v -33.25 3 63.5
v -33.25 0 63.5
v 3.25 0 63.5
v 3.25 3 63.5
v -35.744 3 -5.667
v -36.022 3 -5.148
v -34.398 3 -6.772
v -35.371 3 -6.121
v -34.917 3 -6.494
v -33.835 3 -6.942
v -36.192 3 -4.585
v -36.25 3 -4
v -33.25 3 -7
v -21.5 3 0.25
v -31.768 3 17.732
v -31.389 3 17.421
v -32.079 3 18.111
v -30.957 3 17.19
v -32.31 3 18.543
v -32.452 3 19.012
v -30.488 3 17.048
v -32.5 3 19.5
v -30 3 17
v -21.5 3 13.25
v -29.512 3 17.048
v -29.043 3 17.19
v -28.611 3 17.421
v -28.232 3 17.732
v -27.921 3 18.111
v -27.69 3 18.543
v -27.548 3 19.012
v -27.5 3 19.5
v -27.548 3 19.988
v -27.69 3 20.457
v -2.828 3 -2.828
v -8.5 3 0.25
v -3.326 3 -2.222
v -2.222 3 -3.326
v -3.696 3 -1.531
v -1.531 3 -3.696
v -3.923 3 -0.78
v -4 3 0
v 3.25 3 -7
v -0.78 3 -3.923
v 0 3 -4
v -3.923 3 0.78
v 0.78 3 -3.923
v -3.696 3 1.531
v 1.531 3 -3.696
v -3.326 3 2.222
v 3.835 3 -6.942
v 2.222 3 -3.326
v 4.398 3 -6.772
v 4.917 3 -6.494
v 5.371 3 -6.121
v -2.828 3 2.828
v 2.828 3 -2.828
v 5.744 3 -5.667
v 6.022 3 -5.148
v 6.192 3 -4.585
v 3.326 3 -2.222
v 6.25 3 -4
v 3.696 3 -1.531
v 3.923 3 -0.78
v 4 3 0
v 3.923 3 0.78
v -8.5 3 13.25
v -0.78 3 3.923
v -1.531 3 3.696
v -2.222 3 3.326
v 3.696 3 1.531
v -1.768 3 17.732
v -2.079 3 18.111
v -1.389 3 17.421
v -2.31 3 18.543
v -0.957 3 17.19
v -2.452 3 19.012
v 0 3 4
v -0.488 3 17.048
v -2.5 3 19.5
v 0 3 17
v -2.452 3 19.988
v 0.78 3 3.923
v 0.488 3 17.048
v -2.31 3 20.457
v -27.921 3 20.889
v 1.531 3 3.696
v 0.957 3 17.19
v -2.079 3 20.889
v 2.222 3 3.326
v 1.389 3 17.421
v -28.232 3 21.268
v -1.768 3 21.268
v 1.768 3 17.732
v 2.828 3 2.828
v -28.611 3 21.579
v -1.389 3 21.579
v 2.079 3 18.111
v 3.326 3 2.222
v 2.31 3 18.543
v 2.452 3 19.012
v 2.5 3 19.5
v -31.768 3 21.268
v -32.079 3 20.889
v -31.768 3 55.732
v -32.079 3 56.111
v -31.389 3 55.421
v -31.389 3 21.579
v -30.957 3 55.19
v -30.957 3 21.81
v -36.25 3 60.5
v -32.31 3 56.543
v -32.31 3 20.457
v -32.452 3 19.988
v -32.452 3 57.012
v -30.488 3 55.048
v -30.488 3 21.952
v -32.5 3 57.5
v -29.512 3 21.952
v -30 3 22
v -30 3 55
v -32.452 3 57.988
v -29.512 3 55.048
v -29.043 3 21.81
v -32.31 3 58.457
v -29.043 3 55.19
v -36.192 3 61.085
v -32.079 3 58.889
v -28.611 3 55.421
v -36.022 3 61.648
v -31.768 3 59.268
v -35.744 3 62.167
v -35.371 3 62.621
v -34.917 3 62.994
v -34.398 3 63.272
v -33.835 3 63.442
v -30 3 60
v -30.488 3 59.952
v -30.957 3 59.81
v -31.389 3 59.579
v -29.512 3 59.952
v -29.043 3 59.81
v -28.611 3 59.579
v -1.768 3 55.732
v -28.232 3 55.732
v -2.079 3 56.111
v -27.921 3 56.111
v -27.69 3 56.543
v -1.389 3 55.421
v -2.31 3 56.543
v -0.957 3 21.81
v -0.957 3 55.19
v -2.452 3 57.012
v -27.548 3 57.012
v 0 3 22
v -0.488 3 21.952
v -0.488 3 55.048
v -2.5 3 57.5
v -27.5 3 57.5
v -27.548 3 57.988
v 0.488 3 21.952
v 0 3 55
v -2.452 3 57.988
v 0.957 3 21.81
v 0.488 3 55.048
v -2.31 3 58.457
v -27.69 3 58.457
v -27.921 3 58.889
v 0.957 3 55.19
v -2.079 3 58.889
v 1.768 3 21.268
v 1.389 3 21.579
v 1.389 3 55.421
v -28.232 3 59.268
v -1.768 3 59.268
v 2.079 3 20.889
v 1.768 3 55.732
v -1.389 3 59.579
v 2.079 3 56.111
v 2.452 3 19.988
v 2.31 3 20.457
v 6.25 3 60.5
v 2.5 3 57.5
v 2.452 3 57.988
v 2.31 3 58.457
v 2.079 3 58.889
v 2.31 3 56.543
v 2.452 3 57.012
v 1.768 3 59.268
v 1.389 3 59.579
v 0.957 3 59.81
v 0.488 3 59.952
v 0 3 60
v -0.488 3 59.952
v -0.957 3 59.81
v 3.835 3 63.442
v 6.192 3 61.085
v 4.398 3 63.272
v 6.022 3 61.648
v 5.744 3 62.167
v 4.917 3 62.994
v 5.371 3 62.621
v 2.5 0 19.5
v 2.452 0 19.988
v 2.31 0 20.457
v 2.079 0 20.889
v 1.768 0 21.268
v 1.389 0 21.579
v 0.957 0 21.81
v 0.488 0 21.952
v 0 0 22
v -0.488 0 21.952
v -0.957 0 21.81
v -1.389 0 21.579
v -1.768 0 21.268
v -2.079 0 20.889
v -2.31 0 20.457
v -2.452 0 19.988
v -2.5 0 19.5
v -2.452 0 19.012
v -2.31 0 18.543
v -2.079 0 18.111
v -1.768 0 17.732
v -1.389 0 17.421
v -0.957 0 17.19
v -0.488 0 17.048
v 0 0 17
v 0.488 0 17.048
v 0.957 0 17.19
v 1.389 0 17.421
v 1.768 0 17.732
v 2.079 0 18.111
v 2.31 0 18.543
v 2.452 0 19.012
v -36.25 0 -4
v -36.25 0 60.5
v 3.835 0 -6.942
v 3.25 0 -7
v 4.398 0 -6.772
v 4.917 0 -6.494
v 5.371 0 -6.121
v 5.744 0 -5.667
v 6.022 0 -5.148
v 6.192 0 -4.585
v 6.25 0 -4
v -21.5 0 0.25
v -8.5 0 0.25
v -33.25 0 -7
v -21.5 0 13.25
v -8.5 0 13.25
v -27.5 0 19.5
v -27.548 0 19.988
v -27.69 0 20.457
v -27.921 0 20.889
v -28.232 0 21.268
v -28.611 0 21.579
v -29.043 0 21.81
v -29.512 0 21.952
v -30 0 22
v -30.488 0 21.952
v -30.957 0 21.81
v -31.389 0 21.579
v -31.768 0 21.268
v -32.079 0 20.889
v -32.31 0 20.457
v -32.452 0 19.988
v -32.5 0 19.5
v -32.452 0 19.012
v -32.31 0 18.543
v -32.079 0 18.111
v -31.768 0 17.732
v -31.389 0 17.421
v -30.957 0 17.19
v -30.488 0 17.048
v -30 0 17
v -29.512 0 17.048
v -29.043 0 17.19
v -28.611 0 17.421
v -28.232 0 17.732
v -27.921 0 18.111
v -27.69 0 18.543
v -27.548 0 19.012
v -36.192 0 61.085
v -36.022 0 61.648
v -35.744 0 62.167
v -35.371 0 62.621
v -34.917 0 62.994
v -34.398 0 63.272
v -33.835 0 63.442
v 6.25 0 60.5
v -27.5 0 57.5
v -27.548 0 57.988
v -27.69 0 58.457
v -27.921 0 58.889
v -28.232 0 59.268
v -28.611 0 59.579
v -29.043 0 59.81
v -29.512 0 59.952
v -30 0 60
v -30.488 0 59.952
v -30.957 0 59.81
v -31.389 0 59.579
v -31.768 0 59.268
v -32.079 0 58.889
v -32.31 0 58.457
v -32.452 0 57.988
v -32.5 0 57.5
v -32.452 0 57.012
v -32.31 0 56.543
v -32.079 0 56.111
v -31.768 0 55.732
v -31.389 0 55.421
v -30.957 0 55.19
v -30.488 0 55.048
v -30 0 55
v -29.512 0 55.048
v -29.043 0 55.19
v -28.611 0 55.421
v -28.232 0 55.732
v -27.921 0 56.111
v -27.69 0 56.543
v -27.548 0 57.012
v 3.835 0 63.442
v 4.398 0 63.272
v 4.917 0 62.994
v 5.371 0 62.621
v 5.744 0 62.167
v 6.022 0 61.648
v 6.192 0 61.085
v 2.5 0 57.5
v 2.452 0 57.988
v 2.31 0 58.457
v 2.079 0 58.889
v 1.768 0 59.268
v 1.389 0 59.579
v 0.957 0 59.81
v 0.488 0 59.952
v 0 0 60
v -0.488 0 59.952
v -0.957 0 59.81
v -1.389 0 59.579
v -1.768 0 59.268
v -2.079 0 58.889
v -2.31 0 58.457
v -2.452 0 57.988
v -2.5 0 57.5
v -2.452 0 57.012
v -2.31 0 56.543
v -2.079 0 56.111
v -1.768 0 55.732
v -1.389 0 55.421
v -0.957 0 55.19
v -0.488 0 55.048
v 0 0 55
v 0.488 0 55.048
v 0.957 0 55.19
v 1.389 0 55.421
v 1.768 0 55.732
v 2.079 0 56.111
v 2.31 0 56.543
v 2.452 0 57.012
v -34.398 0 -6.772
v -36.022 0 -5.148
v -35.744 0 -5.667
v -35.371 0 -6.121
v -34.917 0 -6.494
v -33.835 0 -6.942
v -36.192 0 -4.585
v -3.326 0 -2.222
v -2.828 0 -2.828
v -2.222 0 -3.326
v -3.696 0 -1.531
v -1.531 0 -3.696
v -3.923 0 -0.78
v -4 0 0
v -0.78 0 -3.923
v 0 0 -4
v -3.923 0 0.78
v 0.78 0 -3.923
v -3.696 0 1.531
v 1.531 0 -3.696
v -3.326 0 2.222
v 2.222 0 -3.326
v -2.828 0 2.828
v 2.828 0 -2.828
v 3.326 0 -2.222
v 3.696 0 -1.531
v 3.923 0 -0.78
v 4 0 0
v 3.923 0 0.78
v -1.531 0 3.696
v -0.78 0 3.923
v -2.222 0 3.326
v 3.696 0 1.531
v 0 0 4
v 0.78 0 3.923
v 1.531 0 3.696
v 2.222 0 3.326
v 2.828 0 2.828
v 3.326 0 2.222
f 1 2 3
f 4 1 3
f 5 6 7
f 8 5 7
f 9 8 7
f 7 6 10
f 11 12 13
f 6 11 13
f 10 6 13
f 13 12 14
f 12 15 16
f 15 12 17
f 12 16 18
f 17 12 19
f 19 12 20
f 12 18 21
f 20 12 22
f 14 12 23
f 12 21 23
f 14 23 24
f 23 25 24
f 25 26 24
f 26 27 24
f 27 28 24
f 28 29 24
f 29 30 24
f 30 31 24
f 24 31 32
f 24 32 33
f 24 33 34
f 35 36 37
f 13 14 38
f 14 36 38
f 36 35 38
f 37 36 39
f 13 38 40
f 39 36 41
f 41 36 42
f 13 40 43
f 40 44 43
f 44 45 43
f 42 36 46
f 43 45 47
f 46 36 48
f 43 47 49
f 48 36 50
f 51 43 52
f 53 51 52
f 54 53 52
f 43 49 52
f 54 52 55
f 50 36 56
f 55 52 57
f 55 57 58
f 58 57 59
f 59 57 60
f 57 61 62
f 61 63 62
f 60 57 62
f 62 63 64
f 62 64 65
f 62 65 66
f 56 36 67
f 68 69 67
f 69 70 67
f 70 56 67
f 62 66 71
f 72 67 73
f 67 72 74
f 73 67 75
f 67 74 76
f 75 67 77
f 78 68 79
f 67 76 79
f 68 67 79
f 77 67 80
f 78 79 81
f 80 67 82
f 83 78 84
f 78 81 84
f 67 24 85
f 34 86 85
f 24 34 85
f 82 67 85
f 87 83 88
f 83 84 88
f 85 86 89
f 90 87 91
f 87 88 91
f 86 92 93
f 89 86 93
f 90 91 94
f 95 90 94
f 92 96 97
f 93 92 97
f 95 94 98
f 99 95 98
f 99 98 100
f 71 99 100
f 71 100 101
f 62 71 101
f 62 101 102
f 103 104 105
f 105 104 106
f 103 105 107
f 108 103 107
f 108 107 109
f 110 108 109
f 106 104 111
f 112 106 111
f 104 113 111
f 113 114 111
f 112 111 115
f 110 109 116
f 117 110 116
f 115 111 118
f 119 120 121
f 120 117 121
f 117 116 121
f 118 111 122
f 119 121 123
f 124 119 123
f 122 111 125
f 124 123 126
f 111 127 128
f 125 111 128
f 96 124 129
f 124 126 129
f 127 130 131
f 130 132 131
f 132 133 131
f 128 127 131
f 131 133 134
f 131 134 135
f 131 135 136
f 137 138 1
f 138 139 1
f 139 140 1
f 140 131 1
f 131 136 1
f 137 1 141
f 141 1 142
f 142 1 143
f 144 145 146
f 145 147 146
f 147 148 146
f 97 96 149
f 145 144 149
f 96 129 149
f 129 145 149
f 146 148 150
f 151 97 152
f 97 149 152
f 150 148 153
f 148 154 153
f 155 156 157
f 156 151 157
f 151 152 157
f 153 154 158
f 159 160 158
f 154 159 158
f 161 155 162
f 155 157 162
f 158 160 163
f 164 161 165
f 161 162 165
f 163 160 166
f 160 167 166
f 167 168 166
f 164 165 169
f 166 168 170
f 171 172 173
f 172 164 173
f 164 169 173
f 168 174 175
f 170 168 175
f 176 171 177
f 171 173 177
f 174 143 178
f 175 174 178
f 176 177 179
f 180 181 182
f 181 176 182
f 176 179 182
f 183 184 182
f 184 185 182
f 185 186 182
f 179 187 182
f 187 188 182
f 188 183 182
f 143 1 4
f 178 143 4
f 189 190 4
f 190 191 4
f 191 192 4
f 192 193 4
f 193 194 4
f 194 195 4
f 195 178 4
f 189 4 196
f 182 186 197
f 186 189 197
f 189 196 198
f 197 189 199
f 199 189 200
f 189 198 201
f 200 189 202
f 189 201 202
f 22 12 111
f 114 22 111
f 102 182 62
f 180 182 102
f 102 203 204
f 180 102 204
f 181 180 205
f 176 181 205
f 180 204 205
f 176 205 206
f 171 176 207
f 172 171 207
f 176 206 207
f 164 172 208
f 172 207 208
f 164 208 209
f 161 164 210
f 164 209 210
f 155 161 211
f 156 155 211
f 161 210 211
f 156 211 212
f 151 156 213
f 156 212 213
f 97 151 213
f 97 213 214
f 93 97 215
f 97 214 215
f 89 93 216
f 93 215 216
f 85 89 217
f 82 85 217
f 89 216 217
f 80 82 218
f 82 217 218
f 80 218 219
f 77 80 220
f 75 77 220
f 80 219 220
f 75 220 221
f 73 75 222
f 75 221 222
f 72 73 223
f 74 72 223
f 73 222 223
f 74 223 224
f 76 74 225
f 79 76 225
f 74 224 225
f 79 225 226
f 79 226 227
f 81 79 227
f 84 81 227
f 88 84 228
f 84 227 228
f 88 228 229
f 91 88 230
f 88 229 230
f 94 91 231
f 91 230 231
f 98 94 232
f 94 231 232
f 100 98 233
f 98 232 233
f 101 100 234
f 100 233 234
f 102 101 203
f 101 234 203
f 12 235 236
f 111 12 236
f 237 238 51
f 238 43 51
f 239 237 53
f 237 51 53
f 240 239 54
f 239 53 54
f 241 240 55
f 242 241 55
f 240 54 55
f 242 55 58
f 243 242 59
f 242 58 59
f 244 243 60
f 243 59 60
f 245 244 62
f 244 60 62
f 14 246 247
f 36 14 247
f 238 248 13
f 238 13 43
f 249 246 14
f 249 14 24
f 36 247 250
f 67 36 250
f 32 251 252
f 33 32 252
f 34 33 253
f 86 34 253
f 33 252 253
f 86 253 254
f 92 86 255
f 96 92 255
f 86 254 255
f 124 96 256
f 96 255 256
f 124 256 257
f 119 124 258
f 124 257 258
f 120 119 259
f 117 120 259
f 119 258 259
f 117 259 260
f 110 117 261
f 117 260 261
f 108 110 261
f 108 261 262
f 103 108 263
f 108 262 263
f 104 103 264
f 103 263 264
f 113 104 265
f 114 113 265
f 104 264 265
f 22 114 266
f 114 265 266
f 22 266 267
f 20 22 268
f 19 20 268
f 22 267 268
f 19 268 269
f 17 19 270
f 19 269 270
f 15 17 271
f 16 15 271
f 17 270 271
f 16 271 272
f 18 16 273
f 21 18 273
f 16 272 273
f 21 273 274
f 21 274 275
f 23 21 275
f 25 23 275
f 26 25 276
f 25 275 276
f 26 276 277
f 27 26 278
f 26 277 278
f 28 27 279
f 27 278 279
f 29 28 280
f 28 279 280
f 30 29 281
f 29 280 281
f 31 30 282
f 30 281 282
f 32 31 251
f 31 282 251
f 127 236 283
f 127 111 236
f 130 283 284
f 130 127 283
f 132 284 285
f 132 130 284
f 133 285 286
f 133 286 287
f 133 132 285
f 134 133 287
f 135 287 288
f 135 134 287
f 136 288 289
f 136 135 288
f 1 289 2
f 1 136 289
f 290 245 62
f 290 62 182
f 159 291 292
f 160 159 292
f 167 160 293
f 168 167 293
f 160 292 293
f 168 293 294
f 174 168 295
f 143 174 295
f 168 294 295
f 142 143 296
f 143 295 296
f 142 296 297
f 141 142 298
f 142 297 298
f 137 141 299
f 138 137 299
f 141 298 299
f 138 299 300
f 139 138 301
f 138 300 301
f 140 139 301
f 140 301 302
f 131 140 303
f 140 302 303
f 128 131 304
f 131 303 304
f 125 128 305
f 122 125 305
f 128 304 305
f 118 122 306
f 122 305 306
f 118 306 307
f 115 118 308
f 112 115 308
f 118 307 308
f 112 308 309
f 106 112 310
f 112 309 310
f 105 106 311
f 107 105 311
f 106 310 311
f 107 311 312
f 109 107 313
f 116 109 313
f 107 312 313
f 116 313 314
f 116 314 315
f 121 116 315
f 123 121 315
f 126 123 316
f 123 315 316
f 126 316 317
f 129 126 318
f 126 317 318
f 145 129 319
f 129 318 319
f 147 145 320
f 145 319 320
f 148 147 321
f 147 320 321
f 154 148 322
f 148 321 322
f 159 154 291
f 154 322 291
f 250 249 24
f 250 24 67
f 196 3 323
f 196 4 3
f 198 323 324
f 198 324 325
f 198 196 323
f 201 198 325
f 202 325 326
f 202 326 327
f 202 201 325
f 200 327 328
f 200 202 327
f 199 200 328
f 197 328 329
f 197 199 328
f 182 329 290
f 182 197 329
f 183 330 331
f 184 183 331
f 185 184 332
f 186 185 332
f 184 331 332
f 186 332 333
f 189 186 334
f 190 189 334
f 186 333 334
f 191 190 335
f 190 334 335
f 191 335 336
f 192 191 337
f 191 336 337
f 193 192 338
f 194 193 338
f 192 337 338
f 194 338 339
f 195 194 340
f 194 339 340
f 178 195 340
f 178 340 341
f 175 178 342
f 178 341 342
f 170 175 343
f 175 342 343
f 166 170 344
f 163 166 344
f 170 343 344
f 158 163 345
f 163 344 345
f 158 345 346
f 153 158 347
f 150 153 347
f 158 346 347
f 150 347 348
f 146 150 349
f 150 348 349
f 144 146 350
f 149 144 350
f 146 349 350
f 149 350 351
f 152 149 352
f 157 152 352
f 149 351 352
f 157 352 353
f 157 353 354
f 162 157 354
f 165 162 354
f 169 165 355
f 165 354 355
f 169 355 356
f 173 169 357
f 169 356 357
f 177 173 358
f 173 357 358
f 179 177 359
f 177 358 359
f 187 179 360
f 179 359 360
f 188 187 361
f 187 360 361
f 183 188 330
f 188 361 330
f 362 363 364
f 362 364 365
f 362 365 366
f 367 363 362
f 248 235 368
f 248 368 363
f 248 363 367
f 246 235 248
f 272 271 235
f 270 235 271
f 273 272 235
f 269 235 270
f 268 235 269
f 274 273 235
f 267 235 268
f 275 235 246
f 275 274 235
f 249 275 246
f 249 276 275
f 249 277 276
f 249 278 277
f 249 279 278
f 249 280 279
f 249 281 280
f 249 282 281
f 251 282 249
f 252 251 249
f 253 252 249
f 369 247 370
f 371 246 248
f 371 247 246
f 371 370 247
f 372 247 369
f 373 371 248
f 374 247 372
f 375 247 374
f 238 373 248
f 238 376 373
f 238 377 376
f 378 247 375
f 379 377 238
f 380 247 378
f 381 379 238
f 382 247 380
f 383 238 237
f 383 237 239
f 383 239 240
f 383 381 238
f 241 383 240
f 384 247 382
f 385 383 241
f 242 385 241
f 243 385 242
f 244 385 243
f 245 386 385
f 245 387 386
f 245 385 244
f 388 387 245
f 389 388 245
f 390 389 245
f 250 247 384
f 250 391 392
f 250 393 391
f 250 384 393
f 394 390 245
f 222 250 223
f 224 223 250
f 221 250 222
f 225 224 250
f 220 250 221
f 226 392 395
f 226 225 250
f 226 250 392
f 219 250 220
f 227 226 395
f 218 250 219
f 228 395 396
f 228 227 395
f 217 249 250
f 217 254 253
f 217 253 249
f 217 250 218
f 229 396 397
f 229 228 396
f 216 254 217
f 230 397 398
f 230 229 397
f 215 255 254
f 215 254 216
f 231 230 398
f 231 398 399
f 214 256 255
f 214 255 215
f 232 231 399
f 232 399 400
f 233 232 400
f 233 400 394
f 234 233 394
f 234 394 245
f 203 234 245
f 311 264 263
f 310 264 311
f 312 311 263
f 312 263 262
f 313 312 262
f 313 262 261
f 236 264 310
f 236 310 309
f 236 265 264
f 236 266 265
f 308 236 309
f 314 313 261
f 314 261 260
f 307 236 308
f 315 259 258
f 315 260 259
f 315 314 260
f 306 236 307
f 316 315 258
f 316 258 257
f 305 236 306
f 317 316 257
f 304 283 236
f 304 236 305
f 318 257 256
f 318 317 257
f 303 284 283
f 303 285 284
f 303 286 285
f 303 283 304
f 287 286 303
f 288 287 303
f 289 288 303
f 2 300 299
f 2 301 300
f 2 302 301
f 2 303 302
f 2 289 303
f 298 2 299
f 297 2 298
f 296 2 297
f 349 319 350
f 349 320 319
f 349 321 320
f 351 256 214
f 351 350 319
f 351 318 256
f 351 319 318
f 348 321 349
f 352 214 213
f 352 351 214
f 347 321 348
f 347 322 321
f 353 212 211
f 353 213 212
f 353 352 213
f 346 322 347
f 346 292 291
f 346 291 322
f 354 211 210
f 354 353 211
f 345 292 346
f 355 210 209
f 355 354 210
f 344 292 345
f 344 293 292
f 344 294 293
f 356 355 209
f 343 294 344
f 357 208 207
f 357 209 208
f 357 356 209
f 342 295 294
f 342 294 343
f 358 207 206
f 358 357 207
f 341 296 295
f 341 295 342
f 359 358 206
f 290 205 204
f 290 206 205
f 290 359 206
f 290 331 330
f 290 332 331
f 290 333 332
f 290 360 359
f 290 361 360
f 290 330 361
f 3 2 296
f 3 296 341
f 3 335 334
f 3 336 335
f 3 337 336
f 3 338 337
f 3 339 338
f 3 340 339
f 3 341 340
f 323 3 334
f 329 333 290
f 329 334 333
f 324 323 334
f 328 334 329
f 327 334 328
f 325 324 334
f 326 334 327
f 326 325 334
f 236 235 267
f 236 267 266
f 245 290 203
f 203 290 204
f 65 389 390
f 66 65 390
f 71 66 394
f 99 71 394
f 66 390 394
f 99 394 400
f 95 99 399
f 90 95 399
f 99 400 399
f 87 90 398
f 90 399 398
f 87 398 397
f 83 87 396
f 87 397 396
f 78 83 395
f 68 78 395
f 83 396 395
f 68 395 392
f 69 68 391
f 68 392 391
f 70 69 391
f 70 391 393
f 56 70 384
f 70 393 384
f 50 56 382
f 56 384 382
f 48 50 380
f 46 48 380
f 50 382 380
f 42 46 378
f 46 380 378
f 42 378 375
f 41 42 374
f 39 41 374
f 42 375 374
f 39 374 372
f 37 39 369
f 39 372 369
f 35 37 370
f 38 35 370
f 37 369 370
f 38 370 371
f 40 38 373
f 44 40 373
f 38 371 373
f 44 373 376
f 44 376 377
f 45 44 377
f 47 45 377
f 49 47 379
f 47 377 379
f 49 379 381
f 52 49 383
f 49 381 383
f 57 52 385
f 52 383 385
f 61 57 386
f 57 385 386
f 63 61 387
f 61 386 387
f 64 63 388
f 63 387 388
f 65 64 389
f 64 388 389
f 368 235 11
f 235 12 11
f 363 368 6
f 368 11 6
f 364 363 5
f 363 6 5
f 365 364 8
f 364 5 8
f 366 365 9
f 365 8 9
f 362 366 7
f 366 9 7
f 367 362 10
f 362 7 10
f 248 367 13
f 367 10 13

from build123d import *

# Parameters (mm, degrees)
F0_W     = 42.5
F0_H     = 70.5
F0_R     = 2.5
F0_W_2   = 13
F0_H_2   = 13
F0_R_2   = 4
F1_DEPTH = 3
F2_R     = 3


with BuildPart() as f1:
    # F0 (on Front) → F1 (new body)
    with BuildSketch(Plane.XZ):
        with Locations((-15, 28.25)):
            Rectangle(F0_W, F0_H)
        with Locations((-30, 19.5)):
            Circle(F0_R, mode=Mode.SUBTRACT)
        with Locations((-15, 6.75)):
            Rectangle(F0_W_2, F0_H_2, mode=Mode.SUBTRACT)
        Circle(F0_R_2, mode=Mode.SUBTRACT)
        with Locations((0, 19.5)):
            Circle(F0_R, mode=Mode.SUBTRACT)
        with Locations((-30, 57.5)):
            Circle(F0_R, mode=Mode.SUBTRACT)
        with Locations((0, 57.5)):
            Circle(F0_R, mode=Mode.SUBTRACT)
    extrude(amount=-F1_DEPTH)

    # F2
    f2_edges = [f1.edges().sort_by_distance(p)[0] for p in [
        (-36.25, 1.5, 63.5),
        (6.25, 1.5, 63.5),
        (6.25, 1.5, -7),
        (-36.25, 1.5, -7),
    ]]
    fillet(f2_edges, radius=F2_R)


solid = f1.part
